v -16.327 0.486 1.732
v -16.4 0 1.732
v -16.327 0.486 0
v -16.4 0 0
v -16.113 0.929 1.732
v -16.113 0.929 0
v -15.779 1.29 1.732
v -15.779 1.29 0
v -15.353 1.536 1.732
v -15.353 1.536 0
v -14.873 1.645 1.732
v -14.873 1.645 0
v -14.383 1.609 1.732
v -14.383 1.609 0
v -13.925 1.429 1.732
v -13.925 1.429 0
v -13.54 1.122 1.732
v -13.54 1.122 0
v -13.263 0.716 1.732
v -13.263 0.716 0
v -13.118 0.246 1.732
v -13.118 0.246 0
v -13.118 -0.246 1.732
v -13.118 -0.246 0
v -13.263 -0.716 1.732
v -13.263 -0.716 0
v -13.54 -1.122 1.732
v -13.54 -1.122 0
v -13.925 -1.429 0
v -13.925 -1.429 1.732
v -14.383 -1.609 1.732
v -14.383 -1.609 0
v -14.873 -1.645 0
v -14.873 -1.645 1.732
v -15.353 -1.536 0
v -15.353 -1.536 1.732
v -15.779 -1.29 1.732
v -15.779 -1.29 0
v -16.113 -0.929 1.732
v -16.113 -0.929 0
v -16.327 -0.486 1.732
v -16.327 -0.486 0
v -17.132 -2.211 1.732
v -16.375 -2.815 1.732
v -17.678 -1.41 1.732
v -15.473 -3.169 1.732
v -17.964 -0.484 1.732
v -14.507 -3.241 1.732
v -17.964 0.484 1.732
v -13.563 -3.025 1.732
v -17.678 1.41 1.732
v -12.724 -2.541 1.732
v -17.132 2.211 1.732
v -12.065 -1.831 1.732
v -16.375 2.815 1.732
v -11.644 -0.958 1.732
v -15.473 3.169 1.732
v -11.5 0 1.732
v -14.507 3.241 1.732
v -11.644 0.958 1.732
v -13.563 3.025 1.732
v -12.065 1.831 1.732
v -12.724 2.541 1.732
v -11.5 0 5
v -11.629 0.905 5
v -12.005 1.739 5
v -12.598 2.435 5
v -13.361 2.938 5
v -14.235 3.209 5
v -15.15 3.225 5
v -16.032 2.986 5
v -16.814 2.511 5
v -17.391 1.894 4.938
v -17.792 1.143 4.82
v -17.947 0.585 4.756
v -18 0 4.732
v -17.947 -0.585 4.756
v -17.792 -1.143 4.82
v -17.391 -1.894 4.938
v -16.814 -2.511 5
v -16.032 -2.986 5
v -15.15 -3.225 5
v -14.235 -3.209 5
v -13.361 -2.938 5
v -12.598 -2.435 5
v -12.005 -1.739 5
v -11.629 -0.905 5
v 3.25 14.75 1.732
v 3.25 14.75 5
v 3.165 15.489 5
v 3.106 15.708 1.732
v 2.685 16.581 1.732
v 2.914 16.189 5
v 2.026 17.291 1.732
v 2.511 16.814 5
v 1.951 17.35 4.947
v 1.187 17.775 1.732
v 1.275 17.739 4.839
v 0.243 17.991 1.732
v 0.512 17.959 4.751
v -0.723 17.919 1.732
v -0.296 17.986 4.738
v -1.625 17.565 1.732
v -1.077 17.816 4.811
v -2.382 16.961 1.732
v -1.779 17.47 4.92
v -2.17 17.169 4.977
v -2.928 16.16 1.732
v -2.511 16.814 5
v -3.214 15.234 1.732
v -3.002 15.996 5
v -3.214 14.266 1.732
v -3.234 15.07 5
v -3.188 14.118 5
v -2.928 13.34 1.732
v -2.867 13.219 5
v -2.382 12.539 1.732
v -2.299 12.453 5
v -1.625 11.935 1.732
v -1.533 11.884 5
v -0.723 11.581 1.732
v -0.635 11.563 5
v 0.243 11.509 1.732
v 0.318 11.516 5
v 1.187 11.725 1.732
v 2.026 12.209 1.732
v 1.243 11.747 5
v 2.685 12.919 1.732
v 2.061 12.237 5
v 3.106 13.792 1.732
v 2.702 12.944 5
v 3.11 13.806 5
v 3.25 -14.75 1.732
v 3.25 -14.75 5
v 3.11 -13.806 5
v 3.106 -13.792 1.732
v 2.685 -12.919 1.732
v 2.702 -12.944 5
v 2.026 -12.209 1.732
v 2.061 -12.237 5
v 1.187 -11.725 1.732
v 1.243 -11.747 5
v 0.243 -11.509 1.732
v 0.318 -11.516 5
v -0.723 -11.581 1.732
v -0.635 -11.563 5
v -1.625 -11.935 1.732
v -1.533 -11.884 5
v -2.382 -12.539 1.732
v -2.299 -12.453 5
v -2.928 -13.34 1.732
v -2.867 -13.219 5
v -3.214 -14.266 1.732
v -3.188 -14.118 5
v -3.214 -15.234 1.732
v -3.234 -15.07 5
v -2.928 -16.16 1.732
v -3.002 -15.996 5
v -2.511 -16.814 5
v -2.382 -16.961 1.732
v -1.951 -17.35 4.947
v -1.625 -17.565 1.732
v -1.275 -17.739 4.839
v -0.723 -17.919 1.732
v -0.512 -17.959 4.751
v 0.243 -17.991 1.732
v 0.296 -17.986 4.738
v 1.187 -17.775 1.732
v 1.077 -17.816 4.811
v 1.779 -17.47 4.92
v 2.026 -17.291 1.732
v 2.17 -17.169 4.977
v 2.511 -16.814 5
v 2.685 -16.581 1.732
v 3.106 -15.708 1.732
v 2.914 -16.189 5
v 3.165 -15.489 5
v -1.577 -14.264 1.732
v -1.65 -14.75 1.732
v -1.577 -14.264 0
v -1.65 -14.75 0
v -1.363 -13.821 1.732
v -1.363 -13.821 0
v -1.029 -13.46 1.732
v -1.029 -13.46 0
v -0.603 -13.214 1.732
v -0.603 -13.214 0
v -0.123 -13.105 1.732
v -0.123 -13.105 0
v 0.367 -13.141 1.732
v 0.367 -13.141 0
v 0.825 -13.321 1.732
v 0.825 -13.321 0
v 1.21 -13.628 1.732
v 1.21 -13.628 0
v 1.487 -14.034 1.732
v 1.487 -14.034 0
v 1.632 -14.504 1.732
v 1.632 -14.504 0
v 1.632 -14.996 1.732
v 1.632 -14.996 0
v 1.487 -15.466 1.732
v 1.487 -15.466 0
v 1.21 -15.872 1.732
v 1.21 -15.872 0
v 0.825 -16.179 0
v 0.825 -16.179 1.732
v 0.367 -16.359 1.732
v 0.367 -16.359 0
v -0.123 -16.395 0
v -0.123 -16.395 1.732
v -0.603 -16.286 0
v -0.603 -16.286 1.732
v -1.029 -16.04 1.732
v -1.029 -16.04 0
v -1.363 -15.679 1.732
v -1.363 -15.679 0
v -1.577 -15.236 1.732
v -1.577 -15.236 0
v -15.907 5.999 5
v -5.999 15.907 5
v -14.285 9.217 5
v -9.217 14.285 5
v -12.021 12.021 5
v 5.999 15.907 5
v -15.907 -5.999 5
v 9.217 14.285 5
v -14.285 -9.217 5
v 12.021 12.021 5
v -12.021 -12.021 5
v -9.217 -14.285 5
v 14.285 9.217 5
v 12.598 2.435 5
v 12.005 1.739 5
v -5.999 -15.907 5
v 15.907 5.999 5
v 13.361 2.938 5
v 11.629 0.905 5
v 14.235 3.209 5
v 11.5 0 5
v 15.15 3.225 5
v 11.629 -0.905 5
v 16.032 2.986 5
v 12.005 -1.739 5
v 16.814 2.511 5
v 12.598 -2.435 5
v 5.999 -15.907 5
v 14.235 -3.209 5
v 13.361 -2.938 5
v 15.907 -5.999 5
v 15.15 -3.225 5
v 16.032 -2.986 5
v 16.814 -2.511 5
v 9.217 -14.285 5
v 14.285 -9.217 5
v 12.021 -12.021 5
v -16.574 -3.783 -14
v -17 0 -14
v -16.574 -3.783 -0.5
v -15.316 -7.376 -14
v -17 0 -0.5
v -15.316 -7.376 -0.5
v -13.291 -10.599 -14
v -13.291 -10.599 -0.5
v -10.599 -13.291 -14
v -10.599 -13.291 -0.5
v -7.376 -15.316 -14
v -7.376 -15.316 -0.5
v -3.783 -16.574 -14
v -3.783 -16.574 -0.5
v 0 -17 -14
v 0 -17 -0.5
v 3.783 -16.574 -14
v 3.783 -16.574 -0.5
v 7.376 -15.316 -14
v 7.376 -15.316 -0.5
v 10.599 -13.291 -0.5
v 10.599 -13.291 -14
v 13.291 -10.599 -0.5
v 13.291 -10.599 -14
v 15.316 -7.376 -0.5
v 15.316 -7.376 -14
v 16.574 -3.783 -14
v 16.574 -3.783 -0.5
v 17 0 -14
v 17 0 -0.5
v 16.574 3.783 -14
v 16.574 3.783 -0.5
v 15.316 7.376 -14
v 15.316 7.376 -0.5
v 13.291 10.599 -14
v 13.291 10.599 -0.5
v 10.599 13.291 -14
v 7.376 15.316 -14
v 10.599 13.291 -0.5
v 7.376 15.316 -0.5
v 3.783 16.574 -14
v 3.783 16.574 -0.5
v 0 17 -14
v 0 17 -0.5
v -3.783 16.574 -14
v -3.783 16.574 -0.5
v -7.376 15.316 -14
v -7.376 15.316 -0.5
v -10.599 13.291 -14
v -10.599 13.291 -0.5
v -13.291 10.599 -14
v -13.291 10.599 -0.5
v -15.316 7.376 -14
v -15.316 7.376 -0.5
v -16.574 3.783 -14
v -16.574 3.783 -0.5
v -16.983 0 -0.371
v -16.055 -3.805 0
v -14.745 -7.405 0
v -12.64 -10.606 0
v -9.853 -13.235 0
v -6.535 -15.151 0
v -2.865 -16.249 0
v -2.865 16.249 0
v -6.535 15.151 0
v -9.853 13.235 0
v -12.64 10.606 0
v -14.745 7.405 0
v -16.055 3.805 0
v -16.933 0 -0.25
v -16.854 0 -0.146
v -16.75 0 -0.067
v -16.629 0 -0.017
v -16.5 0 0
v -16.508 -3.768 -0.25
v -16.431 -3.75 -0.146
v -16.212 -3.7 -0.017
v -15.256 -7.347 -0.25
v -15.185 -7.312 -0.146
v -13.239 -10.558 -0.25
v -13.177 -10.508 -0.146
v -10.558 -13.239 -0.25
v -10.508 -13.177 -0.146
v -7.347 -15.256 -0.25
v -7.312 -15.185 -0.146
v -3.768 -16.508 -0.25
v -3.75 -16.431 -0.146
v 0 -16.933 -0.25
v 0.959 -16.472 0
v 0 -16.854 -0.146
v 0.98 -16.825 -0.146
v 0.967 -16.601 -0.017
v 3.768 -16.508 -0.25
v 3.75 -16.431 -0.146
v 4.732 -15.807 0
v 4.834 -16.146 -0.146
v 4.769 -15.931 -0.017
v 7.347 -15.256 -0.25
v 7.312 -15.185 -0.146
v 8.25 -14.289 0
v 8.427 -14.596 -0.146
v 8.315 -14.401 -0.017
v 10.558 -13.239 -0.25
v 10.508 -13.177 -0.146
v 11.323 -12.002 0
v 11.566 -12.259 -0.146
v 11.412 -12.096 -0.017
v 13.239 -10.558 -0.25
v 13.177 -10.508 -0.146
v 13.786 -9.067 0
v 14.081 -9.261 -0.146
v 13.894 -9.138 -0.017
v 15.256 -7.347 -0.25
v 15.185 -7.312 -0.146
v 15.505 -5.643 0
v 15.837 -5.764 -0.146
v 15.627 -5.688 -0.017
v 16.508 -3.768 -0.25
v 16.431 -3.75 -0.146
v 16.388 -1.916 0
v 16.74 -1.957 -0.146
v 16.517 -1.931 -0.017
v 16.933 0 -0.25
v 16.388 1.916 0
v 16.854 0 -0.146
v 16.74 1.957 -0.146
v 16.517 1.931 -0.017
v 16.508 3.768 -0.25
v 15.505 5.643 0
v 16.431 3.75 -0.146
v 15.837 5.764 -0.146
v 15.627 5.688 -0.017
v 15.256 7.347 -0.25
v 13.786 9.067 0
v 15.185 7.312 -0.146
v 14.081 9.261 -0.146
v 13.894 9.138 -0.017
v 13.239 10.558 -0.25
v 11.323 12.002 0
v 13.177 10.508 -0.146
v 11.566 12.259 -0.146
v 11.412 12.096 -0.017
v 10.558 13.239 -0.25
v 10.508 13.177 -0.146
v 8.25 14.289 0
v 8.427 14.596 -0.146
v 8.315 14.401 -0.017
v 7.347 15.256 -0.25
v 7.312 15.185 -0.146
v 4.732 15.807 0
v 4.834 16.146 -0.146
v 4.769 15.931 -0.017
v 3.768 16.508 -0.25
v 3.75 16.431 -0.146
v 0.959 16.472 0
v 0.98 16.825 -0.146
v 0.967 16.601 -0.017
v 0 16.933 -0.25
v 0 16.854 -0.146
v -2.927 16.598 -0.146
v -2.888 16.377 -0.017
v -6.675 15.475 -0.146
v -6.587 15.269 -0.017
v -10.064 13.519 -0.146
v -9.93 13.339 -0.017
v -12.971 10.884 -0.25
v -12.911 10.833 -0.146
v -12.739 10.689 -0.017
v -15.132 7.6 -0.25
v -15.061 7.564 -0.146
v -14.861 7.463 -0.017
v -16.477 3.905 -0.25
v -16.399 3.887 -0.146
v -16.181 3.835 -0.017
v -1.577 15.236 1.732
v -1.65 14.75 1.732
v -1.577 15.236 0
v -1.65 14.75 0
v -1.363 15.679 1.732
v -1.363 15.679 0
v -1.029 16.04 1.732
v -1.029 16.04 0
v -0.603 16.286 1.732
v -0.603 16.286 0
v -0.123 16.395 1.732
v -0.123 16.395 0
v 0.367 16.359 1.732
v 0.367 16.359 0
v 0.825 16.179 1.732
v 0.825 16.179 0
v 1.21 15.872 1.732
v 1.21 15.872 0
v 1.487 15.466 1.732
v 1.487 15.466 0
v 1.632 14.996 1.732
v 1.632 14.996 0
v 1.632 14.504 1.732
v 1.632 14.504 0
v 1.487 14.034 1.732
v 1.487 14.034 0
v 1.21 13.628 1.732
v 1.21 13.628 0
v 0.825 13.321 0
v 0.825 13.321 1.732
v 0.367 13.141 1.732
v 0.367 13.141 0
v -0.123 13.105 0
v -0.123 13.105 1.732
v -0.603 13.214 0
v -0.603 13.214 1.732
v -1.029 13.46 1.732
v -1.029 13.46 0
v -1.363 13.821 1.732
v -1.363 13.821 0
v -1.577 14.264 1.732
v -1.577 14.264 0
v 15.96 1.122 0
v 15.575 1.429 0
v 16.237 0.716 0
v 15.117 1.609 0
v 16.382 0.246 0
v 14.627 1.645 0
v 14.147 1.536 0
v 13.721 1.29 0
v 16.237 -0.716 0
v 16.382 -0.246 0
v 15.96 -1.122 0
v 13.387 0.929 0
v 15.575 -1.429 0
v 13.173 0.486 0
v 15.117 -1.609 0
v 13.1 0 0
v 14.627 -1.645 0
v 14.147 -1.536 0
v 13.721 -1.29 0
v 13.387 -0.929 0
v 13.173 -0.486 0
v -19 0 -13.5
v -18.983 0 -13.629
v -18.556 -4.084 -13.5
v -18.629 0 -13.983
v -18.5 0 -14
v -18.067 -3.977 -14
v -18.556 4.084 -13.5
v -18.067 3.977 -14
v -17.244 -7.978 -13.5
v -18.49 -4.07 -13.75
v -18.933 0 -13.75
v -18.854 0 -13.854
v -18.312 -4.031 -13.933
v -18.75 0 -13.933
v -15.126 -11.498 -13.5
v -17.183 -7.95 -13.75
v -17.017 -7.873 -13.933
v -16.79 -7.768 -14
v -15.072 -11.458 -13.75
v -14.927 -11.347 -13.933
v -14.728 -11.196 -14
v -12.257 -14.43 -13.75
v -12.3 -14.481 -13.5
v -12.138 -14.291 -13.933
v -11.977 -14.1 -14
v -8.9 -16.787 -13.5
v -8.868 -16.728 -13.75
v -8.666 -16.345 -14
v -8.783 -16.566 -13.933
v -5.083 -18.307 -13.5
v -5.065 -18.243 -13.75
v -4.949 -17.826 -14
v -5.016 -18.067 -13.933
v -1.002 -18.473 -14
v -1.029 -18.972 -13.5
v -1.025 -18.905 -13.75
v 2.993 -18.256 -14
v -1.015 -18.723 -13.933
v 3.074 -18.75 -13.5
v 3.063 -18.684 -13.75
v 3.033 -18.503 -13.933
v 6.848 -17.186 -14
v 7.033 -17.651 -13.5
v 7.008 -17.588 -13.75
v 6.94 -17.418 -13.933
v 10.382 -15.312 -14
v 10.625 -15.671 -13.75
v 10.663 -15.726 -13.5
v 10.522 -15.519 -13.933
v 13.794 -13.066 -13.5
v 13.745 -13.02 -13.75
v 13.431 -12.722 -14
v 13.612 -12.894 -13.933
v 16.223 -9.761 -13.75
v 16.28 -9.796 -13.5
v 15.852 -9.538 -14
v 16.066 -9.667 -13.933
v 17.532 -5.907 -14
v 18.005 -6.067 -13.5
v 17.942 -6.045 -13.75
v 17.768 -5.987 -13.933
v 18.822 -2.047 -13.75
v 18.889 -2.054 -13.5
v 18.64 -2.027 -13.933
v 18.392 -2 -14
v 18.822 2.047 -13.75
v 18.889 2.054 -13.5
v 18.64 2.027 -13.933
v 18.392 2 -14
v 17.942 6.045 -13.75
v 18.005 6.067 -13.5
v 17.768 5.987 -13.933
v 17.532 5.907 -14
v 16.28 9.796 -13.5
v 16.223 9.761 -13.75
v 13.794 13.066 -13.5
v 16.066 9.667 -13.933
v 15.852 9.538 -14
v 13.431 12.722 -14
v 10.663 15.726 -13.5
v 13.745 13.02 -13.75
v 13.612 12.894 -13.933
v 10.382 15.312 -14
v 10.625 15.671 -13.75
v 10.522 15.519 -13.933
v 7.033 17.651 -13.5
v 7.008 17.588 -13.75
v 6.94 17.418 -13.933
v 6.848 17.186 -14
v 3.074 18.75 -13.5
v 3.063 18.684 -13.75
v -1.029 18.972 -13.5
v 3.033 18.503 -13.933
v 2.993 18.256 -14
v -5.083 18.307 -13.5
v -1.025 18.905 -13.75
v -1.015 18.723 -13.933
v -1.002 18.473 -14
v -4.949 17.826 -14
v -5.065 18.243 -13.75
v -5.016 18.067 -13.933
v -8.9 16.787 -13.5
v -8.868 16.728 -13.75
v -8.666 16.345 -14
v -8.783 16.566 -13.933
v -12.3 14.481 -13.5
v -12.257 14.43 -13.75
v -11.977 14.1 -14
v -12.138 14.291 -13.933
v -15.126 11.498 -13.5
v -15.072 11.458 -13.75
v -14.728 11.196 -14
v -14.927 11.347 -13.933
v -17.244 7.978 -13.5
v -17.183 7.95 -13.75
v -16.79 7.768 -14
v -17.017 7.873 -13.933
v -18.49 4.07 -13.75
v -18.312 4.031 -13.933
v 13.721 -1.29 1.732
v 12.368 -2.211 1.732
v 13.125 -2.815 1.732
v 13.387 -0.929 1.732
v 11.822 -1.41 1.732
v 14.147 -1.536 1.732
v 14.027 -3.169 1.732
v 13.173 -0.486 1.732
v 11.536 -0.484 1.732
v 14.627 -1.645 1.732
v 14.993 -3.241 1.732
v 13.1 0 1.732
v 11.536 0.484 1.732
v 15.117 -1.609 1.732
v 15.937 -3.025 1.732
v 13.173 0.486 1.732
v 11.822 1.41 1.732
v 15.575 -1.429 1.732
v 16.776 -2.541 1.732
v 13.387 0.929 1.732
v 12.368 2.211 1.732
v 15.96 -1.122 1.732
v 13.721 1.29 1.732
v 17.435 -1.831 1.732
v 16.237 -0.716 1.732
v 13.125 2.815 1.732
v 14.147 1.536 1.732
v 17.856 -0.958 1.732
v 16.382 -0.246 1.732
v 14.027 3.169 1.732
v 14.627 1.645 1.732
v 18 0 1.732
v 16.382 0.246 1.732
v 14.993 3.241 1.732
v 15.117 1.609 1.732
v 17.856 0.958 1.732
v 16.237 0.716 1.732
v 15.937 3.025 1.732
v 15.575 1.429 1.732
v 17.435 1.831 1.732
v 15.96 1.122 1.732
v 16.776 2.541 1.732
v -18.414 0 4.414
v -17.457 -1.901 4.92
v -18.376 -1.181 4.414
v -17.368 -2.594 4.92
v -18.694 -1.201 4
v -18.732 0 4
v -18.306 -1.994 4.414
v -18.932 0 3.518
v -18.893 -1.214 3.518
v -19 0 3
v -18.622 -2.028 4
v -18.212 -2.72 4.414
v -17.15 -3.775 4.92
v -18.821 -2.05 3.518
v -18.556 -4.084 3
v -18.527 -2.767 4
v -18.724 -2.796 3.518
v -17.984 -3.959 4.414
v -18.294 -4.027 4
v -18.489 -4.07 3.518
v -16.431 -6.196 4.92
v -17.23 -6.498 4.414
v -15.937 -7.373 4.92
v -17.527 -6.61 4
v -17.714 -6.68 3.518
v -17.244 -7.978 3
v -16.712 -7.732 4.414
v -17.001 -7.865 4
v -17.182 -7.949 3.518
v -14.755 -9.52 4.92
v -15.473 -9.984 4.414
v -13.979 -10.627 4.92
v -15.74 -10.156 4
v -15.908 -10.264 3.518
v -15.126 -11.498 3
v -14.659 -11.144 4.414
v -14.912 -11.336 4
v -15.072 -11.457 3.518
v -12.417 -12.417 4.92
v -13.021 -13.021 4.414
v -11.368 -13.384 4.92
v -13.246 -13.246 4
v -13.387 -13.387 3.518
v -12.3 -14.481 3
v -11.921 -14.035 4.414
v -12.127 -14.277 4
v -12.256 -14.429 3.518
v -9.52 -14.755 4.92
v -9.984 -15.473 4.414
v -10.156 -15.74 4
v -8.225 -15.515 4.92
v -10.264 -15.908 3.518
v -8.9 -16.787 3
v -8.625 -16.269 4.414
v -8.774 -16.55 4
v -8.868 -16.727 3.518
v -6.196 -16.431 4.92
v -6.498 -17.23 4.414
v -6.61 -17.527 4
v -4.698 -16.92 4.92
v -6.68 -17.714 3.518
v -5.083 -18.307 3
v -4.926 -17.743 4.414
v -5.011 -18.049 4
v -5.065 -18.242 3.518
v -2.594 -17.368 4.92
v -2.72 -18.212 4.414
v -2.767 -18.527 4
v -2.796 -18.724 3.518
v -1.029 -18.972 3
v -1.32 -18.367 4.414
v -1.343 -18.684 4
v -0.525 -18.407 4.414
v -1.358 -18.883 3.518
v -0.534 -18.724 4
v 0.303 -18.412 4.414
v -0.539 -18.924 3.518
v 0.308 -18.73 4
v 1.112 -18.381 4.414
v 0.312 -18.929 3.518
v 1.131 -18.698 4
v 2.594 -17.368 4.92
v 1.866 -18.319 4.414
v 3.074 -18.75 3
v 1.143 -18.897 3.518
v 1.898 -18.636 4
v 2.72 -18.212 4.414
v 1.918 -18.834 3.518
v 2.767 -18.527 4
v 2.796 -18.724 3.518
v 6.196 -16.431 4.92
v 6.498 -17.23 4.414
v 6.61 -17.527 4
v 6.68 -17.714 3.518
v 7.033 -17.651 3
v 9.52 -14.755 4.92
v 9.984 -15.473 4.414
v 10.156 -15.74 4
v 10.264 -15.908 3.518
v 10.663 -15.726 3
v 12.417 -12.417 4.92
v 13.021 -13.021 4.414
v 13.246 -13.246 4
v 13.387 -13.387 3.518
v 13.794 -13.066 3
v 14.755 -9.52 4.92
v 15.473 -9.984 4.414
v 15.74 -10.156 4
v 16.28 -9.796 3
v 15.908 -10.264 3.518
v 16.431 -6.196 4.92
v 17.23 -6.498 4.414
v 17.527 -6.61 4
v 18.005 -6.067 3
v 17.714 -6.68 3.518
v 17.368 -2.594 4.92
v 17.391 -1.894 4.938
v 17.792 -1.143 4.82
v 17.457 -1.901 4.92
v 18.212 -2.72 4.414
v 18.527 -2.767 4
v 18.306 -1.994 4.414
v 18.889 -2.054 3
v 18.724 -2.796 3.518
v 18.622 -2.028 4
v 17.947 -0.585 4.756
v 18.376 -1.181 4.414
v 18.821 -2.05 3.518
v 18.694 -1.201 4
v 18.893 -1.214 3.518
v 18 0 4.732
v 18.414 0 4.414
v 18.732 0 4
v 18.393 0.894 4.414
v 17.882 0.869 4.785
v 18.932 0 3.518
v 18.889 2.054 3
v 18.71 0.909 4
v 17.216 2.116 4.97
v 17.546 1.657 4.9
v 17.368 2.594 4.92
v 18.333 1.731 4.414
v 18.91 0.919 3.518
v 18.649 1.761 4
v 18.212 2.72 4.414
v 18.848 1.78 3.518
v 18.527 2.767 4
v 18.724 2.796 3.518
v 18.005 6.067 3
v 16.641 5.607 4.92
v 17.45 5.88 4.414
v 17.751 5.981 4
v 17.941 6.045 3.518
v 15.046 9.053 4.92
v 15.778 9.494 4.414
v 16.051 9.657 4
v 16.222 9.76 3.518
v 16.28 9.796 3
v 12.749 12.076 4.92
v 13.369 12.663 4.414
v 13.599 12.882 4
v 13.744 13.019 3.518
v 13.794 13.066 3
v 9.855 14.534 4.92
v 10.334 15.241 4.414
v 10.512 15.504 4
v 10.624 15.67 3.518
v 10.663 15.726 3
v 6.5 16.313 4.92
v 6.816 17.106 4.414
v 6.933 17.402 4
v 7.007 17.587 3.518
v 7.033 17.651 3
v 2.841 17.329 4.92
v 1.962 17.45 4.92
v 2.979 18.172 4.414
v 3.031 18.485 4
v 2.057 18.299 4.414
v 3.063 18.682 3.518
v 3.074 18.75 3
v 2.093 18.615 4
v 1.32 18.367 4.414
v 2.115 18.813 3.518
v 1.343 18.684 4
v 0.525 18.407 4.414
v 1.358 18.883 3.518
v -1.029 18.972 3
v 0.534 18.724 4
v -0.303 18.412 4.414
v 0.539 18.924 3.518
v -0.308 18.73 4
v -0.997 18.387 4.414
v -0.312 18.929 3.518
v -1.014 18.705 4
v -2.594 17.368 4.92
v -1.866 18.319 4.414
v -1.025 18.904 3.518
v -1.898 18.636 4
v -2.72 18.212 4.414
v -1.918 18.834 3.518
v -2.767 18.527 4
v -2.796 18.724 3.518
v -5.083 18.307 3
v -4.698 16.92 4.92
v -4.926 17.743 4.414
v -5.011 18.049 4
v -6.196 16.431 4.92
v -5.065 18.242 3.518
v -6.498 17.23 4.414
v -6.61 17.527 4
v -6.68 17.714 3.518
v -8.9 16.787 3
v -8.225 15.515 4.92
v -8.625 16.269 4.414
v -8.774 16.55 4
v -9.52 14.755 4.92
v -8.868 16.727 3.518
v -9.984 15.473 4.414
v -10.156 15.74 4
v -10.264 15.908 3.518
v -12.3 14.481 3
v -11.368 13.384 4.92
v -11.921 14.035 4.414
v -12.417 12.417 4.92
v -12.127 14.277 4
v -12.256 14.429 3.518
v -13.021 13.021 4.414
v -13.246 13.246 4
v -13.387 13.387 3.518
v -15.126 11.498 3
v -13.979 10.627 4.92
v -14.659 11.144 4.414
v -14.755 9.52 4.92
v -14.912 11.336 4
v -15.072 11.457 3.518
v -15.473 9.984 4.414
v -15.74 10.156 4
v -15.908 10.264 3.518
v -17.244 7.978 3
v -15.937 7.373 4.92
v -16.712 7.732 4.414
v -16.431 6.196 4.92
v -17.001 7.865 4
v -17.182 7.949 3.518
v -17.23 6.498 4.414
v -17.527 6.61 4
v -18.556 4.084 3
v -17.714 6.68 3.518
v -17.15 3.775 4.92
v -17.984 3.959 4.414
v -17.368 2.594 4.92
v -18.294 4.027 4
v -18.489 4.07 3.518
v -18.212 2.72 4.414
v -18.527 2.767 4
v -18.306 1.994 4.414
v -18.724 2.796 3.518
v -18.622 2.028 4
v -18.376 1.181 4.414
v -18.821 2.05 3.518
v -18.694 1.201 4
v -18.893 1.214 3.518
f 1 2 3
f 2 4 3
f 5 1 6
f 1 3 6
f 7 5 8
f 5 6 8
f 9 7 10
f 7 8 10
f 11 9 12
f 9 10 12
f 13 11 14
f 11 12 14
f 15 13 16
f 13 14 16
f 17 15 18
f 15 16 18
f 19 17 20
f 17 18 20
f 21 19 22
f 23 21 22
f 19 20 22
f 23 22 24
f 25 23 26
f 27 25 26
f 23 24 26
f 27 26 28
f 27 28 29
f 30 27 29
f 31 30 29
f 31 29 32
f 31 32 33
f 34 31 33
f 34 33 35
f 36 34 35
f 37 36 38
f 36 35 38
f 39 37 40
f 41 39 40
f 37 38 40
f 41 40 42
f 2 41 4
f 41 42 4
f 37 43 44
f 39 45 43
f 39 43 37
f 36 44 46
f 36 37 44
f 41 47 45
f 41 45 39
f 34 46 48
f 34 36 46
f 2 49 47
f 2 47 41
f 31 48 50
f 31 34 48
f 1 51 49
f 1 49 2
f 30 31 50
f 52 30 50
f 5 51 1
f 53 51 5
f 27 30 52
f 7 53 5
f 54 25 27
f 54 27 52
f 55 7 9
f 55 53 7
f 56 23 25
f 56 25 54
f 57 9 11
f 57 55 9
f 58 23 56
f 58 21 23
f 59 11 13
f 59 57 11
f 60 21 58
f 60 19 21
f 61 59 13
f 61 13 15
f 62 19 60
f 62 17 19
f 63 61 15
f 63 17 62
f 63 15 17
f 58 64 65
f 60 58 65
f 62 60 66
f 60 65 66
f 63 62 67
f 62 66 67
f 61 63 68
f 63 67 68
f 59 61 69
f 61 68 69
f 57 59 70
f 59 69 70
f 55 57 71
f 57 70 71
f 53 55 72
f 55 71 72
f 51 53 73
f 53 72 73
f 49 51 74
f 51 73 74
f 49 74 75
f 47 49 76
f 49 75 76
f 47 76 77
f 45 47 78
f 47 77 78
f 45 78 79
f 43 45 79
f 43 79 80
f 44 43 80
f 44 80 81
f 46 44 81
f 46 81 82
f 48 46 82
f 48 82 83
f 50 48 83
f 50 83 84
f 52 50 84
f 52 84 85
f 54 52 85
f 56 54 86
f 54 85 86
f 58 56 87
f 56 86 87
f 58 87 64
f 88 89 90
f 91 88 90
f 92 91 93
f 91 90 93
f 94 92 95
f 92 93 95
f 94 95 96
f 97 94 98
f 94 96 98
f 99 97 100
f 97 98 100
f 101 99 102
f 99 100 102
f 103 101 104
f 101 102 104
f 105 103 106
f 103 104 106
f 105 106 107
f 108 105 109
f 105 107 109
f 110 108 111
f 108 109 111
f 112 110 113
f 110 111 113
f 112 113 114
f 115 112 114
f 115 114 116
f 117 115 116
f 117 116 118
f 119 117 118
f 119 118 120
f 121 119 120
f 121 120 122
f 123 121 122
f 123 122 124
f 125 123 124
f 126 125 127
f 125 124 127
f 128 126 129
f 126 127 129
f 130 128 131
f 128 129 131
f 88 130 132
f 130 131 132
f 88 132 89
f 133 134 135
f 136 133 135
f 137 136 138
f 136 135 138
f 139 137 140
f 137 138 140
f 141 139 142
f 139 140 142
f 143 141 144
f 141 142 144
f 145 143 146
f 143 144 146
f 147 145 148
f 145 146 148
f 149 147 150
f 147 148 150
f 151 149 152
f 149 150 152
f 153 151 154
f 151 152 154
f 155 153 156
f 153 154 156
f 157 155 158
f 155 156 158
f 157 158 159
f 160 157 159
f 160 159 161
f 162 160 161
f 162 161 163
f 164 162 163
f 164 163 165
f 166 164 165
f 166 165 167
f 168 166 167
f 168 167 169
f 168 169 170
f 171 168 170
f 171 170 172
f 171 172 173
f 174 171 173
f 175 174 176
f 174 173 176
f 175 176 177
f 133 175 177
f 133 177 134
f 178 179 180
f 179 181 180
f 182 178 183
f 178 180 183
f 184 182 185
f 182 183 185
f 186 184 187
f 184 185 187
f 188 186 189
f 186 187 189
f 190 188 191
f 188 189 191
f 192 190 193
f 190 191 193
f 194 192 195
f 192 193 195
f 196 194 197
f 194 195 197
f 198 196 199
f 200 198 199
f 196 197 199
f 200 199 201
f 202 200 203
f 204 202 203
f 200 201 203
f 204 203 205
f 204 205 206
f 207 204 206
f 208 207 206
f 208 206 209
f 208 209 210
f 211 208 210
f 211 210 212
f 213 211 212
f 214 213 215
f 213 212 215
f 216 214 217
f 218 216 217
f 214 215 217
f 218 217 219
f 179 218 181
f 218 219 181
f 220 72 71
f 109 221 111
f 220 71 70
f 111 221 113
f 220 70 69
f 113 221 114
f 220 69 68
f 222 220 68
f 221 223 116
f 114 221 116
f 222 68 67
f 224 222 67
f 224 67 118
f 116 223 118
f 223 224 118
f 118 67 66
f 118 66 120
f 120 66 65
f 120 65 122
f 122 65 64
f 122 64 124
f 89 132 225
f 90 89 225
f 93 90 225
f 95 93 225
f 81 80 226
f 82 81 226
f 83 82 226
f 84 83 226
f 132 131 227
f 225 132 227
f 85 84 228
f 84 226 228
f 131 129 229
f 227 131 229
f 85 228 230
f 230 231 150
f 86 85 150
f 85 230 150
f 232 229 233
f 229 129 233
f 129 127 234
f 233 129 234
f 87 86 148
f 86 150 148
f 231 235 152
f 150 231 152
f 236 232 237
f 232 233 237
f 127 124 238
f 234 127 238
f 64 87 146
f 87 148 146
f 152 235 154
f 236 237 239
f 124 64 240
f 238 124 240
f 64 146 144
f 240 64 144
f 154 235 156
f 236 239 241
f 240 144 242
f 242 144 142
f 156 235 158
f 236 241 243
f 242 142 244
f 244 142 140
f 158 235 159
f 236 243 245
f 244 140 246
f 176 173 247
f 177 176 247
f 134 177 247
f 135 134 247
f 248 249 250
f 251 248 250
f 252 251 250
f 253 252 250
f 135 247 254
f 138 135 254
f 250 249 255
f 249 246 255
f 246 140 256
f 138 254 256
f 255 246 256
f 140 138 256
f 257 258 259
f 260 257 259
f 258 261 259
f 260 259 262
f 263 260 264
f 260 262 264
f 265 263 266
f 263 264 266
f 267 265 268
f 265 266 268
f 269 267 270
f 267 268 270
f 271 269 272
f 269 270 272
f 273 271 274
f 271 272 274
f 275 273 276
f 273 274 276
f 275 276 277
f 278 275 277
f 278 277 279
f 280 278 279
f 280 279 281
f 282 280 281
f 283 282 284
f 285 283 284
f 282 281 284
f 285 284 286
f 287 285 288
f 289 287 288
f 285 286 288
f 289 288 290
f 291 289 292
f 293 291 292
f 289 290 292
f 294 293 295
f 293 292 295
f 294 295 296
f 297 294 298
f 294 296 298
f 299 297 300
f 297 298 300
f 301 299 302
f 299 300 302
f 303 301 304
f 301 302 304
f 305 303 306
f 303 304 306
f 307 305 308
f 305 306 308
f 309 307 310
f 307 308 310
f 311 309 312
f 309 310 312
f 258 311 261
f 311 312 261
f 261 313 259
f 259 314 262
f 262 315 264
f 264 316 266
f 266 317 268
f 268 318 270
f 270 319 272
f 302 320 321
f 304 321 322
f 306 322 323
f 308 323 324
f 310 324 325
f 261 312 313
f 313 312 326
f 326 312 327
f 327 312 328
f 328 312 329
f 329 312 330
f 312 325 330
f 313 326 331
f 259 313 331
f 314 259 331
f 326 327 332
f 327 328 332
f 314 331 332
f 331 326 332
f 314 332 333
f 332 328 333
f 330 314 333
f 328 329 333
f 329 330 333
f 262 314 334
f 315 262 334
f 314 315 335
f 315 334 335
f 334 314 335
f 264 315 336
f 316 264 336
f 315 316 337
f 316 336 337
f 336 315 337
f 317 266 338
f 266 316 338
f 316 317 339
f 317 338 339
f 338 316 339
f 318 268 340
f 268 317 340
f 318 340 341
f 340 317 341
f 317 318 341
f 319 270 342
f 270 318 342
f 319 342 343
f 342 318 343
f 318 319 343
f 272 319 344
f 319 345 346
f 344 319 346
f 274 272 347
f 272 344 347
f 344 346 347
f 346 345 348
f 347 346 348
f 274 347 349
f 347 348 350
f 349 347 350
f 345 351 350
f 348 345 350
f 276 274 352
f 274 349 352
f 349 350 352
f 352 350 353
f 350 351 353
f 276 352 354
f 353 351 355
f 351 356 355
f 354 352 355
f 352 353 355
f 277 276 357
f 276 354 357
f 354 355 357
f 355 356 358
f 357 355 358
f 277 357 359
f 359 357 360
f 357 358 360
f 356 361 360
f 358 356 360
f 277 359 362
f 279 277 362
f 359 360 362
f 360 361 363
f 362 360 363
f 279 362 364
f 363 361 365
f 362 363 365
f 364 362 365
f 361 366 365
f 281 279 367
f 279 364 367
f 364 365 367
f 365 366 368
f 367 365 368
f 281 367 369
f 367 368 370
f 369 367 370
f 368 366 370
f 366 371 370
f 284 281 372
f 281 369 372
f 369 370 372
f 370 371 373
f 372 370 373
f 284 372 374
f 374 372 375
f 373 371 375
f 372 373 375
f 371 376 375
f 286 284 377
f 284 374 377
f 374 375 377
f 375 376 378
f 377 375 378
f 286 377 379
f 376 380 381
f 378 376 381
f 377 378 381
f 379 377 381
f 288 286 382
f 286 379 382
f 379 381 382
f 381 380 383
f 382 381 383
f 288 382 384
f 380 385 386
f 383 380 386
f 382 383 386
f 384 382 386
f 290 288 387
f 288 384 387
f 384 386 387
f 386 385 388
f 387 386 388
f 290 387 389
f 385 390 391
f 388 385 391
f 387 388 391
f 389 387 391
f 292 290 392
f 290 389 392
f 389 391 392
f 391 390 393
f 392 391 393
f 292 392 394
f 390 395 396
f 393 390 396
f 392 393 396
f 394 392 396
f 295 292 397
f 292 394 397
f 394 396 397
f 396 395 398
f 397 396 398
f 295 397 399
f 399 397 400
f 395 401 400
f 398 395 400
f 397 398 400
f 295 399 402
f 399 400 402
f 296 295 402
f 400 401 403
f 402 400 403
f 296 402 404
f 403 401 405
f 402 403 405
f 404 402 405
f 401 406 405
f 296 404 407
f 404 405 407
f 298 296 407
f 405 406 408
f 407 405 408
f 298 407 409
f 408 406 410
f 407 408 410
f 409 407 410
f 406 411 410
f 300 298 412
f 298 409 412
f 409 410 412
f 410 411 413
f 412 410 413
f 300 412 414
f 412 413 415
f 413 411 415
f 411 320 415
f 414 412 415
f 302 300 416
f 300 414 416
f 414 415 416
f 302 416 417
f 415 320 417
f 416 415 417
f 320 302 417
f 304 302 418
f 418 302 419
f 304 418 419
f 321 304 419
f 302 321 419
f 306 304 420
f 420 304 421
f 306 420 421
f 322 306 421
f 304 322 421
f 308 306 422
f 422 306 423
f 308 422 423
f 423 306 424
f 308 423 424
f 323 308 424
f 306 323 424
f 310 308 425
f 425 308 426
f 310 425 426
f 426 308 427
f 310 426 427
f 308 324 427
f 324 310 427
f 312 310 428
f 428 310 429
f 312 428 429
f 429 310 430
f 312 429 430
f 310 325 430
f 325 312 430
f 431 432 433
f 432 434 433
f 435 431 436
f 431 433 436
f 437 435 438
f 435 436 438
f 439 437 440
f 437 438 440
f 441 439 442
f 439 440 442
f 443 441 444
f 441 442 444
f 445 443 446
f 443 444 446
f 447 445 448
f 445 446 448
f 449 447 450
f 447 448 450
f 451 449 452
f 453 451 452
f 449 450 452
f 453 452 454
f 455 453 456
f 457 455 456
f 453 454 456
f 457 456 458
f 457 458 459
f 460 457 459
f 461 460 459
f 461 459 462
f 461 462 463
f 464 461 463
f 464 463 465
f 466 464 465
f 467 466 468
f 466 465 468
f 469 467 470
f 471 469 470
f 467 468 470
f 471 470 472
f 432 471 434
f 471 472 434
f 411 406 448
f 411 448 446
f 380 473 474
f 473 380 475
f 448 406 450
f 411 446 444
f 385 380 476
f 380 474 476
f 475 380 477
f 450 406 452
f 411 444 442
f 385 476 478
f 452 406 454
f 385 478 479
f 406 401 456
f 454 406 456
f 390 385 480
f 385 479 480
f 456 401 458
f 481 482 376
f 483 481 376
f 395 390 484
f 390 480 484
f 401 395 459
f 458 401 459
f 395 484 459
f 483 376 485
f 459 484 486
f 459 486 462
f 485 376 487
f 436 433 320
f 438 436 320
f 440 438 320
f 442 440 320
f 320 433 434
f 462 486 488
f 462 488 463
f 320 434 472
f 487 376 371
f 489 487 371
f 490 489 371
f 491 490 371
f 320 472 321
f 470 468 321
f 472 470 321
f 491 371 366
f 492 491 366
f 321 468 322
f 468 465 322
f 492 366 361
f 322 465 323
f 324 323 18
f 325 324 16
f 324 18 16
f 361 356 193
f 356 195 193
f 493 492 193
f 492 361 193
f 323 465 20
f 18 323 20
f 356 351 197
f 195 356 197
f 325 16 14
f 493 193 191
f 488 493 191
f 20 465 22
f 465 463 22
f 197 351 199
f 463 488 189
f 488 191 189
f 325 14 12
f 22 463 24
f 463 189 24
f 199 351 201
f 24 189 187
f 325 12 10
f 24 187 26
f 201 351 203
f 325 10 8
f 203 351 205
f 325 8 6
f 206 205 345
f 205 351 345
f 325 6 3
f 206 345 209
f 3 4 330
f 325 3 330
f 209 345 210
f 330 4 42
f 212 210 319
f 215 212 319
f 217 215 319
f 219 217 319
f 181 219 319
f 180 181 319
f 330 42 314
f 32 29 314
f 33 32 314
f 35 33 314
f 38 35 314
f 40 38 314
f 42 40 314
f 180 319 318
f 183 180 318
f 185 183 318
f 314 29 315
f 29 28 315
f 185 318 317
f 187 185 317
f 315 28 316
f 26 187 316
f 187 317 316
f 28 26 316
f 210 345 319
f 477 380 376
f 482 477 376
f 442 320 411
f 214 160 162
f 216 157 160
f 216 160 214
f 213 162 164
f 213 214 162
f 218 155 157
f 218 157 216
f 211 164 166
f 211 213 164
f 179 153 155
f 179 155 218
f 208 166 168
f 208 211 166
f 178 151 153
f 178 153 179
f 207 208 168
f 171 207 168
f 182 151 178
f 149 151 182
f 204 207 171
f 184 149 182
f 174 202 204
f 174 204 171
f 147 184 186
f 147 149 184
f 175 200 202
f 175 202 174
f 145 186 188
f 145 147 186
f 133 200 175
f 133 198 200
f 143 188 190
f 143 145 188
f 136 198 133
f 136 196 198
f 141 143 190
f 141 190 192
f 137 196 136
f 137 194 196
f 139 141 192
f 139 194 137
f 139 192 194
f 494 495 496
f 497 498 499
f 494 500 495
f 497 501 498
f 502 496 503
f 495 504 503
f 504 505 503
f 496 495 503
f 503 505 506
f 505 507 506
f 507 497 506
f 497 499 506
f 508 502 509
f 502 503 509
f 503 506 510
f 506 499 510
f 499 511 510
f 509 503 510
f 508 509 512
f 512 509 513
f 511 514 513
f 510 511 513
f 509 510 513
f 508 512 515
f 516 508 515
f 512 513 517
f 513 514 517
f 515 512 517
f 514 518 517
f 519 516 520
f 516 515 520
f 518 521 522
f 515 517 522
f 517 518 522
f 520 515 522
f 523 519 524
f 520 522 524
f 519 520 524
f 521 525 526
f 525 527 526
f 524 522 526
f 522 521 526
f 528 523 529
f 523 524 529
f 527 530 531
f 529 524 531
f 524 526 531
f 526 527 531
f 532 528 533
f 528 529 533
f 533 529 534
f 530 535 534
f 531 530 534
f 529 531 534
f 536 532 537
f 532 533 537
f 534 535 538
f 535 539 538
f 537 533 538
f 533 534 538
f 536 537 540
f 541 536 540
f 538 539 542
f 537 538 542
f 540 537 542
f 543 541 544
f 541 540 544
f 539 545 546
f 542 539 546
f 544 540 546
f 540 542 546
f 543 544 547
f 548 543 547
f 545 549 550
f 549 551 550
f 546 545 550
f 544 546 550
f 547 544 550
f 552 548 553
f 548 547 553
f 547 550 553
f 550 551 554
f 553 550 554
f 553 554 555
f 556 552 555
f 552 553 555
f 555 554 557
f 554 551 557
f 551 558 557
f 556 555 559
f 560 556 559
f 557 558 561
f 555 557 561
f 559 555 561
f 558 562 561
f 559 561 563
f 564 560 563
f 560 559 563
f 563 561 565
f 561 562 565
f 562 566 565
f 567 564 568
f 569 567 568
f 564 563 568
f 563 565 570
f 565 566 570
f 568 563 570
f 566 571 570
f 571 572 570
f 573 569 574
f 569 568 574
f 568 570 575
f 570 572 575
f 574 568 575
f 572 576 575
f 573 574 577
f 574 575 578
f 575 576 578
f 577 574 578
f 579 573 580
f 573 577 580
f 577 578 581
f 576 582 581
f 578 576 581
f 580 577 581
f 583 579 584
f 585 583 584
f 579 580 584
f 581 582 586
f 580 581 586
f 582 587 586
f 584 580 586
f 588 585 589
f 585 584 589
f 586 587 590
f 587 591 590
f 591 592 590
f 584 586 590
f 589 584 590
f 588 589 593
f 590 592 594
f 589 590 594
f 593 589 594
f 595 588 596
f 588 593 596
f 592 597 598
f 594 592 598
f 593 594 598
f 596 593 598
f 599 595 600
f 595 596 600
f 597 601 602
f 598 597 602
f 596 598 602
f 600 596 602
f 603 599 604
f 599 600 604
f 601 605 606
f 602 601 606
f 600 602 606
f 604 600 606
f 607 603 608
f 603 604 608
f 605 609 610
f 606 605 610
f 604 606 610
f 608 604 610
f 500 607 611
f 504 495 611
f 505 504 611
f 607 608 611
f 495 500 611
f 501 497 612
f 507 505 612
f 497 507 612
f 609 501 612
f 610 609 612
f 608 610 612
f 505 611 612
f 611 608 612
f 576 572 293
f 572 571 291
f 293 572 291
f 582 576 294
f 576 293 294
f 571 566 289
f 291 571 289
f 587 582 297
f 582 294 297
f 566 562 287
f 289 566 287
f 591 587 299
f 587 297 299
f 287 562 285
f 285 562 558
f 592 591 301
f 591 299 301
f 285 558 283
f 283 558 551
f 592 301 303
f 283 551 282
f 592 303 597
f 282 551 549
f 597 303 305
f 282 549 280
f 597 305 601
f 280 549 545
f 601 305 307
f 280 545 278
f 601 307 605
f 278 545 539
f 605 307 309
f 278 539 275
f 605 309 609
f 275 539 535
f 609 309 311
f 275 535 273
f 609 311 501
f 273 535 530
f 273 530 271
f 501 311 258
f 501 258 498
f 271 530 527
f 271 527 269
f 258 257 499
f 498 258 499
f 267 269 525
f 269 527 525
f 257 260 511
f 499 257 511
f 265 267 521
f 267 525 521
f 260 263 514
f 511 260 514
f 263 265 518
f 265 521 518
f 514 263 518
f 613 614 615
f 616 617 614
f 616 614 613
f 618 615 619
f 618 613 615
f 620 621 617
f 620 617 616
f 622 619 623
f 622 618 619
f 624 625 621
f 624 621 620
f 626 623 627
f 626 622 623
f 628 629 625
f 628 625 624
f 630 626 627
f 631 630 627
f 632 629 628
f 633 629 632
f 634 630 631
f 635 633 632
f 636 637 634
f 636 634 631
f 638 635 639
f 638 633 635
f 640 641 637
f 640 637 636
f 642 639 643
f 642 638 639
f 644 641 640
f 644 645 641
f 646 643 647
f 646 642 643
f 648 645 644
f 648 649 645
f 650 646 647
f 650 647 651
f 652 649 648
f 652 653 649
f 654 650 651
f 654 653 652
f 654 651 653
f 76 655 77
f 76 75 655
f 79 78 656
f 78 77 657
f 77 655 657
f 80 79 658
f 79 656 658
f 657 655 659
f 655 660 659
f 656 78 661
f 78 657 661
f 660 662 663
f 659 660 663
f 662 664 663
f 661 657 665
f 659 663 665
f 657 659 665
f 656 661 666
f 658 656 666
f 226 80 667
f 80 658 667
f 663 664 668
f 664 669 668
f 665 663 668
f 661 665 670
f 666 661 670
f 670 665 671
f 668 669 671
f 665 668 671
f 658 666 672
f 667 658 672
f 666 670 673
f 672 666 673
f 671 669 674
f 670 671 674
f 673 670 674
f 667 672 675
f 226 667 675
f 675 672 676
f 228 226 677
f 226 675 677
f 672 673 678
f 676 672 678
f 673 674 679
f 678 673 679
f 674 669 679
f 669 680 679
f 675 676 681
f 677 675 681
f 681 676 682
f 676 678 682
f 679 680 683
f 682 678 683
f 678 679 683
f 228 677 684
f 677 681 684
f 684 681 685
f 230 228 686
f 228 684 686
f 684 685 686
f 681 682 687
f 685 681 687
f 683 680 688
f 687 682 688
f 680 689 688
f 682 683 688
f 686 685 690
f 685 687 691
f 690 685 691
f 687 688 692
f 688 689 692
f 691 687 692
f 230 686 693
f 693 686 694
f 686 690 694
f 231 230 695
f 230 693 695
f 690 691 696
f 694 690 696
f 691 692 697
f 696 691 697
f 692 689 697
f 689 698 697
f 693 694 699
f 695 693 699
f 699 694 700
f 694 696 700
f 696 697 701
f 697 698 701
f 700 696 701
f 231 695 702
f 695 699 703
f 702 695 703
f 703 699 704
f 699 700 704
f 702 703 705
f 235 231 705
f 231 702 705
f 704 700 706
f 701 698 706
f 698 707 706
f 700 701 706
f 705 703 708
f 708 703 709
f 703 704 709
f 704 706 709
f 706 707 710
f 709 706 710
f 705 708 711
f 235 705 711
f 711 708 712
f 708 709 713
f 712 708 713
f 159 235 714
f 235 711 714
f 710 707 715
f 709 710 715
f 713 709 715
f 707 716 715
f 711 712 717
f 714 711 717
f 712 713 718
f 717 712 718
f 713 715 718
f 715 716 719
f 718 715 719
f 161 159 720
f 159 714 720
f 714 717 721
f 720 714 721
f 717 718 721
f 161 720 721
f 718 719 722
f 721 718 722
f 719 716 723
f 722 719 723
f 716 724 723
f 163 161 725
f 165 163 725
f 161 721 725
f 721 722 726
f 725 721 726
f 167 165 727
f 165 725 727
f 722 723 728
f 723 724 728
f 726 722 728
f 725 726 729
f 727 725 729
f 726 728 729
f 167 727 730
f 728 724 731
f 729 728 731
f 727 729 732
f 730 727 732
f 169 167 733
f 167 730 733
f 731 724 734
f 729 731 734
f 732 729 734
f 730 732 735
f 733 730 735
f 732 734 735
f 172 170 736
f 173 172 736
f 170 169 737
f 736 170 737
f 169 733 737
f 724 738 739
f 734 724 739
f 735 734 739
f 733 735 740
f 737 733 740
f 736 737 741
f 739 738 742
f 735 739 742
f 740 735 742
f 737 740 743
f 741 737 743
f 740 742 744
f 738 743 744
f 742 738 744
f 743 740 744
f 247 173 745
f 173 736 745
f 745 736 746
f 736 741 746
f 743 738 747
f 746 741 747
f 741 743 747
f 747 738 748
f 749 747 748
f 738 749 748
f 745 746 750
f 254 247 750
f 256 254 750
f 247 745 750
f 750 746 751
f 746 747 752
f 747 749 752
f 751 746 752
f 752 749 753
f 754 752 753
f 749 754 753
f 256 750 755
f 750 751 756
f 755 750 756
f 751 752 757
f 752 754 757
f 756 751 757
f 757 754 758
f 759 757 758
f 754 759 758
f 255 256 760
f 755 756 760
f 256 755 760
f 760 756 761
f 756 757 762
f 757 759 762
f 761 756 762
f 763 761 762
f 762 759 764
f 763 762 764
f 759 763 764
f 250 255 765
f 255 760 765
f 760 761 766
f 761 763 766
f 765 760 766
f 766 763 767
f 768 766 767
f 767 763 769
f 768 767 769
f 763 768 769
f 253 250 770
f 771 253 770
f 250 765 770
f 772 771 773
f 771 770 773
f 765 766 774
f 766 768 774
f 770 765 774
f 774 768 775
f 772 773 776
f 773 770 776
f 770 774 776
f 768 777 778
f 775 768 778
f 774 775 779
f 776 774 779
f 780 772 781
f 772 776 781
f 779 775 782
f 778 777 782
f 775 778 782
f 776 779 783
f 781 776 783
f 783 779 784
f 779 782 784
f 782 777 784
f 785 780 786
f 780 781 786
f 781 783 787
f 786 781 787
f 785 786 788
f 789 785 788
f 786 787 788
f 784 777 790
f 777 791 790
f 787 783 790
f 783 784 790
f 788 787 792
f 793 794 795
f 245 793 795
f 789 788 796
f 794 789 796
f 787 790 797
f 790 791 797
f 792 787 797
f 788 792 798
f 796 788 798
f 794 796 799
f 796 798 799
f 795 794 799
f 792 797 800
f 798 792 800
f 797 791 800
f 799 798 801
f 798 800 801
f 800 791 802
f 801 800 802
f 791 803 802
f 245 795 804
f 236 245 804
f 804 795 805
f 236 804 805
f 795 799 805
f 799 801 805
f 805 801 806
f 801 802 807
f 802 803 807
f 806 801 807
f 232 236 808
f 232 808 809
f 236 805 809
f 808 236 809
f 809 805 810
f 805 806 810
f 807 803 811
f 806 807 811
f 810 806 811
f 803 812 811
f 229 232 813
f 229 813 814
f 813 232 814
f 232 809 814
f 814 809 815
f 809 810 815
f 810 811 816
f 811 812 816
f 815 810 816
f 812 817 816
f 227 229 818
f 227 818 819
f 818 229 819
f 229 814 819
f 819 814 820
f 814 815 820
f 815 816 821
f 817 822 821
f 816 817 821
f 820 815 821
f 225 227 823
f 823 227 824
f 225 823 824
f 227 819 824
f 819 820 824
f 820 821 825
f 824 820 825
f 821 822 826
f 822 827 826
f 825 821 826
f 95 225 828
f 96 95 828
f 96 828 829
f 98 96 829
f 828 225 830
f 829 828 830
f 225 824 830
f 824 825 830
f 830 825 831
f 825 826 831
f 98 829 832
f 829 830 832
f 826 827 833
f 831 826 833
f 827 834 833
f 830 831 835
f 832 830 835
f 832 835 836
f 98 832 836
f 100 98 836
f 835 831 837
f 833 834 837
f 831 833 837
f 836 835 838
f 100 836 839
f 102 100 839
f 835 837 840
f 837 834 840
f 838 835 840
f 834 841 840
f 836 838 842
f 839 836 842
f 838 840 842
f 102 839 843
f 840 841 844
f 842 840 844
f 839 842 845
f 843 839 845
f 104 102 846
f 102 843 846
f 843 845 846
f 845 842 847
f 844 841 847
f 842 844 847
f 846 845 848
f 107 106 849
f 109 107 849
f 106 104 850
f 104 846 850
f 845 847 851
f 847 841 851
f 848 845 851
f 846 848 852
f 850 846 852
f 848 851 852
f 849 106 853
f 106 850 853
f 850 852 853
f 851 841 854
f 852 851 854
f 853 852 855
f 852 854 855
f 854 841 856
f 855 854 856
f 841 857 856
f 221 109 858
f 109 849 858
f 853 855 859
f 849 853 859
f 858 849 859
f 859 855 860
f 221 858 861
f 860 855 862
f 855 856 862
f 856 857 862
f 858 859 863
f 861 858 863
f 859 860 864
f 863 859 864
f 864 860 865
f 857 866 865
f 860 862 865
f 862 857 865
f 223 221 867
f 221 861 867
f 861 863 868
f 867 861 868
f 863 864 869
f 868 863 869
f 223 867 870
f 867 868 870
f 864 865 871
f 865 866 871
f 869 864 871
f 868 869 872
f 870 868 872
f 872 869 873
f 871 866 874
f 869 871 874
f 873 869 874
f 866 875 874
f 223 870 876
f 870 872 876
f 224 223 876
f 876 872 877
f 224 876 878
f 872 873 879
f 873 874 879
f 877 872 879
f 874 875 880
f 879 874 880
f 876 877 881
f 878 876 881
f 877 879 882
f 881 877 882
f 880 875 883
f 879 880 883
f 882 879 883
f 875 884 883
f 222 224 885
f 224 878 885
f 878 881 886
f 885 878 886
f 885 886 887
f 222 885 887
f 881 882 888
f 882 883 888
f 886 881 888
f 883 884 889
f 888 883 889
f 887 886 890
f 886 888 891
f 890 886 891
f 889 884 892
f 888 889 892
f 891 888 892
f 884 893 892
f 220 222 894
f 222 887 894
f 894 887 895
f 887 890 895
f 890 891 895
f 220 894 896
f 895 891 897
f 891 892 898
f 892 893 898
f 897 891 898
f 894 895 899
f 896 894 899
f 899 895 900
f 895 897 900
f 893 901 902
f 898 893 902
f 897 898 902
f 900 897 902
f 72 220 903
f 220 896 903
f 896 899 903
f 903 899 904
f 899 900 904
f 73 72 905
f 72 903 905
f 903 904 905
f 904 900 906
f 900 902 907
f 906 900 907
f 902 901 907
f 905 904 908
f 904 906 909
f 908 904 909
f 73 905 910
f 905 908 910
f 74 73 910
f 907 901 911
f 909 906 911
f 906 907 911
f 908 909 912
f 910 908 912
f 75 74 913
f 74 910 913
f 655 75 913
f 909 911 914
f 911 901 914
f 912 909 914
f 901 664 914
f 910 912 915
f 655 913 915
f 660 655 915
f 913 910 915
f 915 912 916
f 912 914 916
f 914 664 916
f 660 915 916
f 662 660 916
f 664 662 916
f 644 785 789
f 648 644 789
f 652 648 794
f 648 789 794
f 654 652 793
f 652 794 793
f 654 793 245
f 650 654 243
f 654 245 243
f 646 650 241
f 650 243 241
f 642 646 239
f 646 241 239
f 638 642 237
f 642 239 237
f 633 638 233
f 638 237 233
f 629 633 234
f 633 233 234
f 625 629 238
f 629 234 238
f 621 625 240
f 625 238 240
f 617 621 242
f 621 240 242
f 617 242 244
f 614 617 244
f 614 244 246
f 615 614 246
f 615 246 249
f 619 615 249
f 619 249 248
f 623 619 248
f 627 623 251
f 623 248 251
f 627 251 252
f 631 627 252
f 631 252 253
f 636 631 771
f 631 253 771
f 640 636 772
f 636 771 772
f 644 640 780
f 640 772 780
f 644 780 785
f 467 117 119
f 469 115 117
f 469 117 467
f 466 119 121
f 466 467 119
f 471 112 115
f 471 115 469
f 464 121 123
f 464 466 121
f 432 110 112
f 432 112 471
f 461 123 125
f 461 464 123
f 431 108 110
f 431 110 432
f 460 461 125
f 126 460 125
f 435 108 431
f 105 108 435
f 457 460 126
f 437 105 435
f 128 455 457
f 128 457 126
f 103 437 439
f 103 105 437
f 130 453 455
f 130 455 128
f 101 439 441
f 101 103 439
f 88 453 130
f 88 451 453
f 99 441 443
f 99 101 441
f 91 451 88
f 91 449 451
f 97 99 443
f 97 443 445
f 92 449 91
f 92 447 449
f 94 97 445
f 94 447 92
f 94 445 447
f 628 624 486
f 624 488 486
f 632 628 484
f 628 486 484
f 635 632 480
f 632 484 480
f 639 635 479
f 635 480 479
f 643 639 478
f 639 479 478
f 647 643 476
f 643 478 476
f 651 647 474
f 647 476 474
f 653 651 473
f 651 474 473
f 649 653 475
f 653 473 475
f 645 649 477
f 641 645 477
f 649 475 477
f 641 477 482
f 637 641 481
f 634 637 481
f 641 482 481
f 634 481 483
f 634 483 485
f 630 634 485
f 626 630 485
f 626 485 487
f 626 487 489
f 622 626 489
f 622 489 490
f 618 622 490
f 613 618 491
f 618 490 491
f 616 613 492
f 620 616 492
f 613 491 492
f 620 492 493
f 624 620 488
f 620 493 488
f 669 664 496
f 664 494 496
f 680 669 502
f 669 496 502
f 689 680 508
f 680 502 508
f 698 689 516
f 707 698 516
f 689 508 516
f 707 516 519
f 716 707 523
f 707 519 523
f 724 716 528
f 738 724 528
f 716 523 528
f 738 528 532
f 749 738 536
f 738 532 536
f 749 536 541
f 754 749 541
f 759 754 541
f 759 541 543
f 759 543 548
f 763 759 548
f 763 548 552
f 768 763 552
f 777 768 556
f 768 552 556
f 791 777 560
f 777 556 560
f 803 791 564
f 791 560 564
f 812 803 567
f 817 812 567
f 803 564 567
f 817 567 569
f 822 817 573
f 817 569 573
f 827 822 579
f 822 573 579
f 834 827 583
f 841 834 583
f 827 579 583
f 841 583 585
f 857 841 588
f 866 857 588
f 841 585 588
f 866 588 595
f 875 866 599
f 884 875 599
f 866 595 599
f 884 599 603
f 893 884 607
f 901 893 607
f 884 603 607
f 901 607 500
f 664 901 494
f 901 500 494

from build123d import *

# Parameters (mm, degrees)
F3_D           = 3.3
F3_DEPTH       = 8
F3_START       = 0.2679493
F3_CBORE_D     = 6.5
F3_CBORE_DEPTH = 3
F3_TIP         = 0.9914200214


with BuildPart() as f1:
    # F0 (on Front) → F1 (revolve)
    with BuildSketch(Plane.XZ):
        with BuildLine():
            Line((-16.5, 0), (0, 0))
            Line((0, 0), (0, 5))
            Line((0, 5), (-17, 5))
            ThreePointArc((-17, 5), (-18.4142135624, 4.4142135624), (-19, 3))
            Line((-19, 3), (-19, -13.5))
            ThreePointArc((-19, -13.5), (-18.8535533906, -13.8535533906), (-18.5, -14))
            Line((-18.5, -14), (-17, -14))
            Line((-17, -14), (-17, -0.5))
            ThreePointArc((-17, -0.5), (-16.8535533906, -0.1464466094), (-16.5, 0))
        make_face()
    revolve(axis=Axis((0, 0, 2.5), (0, 0, 1)))

    # F3
    # its depths count from where the whole tool has entered the part; down to there all is cleared
    with Locations(Plane.XY.offset(5).offset(-F3_START)):
        with Locations((0, 14.75), (14.75, 0), (0, -14.75), (-14.75, 0)):
            CounterBoreHole(F3_D / 2, F3_CBORE_D / 2, F3_CBORE_DEPTH, depth=F3_DEPTH)
            with Locations((0, 0, -(F3_DEPTH + F3_TIP / 2))):  # 118° drill point
                Cone(0, F3_D / 2, F3_TIP, mode=Mode.SUBTRACT)


solid = f1.part
